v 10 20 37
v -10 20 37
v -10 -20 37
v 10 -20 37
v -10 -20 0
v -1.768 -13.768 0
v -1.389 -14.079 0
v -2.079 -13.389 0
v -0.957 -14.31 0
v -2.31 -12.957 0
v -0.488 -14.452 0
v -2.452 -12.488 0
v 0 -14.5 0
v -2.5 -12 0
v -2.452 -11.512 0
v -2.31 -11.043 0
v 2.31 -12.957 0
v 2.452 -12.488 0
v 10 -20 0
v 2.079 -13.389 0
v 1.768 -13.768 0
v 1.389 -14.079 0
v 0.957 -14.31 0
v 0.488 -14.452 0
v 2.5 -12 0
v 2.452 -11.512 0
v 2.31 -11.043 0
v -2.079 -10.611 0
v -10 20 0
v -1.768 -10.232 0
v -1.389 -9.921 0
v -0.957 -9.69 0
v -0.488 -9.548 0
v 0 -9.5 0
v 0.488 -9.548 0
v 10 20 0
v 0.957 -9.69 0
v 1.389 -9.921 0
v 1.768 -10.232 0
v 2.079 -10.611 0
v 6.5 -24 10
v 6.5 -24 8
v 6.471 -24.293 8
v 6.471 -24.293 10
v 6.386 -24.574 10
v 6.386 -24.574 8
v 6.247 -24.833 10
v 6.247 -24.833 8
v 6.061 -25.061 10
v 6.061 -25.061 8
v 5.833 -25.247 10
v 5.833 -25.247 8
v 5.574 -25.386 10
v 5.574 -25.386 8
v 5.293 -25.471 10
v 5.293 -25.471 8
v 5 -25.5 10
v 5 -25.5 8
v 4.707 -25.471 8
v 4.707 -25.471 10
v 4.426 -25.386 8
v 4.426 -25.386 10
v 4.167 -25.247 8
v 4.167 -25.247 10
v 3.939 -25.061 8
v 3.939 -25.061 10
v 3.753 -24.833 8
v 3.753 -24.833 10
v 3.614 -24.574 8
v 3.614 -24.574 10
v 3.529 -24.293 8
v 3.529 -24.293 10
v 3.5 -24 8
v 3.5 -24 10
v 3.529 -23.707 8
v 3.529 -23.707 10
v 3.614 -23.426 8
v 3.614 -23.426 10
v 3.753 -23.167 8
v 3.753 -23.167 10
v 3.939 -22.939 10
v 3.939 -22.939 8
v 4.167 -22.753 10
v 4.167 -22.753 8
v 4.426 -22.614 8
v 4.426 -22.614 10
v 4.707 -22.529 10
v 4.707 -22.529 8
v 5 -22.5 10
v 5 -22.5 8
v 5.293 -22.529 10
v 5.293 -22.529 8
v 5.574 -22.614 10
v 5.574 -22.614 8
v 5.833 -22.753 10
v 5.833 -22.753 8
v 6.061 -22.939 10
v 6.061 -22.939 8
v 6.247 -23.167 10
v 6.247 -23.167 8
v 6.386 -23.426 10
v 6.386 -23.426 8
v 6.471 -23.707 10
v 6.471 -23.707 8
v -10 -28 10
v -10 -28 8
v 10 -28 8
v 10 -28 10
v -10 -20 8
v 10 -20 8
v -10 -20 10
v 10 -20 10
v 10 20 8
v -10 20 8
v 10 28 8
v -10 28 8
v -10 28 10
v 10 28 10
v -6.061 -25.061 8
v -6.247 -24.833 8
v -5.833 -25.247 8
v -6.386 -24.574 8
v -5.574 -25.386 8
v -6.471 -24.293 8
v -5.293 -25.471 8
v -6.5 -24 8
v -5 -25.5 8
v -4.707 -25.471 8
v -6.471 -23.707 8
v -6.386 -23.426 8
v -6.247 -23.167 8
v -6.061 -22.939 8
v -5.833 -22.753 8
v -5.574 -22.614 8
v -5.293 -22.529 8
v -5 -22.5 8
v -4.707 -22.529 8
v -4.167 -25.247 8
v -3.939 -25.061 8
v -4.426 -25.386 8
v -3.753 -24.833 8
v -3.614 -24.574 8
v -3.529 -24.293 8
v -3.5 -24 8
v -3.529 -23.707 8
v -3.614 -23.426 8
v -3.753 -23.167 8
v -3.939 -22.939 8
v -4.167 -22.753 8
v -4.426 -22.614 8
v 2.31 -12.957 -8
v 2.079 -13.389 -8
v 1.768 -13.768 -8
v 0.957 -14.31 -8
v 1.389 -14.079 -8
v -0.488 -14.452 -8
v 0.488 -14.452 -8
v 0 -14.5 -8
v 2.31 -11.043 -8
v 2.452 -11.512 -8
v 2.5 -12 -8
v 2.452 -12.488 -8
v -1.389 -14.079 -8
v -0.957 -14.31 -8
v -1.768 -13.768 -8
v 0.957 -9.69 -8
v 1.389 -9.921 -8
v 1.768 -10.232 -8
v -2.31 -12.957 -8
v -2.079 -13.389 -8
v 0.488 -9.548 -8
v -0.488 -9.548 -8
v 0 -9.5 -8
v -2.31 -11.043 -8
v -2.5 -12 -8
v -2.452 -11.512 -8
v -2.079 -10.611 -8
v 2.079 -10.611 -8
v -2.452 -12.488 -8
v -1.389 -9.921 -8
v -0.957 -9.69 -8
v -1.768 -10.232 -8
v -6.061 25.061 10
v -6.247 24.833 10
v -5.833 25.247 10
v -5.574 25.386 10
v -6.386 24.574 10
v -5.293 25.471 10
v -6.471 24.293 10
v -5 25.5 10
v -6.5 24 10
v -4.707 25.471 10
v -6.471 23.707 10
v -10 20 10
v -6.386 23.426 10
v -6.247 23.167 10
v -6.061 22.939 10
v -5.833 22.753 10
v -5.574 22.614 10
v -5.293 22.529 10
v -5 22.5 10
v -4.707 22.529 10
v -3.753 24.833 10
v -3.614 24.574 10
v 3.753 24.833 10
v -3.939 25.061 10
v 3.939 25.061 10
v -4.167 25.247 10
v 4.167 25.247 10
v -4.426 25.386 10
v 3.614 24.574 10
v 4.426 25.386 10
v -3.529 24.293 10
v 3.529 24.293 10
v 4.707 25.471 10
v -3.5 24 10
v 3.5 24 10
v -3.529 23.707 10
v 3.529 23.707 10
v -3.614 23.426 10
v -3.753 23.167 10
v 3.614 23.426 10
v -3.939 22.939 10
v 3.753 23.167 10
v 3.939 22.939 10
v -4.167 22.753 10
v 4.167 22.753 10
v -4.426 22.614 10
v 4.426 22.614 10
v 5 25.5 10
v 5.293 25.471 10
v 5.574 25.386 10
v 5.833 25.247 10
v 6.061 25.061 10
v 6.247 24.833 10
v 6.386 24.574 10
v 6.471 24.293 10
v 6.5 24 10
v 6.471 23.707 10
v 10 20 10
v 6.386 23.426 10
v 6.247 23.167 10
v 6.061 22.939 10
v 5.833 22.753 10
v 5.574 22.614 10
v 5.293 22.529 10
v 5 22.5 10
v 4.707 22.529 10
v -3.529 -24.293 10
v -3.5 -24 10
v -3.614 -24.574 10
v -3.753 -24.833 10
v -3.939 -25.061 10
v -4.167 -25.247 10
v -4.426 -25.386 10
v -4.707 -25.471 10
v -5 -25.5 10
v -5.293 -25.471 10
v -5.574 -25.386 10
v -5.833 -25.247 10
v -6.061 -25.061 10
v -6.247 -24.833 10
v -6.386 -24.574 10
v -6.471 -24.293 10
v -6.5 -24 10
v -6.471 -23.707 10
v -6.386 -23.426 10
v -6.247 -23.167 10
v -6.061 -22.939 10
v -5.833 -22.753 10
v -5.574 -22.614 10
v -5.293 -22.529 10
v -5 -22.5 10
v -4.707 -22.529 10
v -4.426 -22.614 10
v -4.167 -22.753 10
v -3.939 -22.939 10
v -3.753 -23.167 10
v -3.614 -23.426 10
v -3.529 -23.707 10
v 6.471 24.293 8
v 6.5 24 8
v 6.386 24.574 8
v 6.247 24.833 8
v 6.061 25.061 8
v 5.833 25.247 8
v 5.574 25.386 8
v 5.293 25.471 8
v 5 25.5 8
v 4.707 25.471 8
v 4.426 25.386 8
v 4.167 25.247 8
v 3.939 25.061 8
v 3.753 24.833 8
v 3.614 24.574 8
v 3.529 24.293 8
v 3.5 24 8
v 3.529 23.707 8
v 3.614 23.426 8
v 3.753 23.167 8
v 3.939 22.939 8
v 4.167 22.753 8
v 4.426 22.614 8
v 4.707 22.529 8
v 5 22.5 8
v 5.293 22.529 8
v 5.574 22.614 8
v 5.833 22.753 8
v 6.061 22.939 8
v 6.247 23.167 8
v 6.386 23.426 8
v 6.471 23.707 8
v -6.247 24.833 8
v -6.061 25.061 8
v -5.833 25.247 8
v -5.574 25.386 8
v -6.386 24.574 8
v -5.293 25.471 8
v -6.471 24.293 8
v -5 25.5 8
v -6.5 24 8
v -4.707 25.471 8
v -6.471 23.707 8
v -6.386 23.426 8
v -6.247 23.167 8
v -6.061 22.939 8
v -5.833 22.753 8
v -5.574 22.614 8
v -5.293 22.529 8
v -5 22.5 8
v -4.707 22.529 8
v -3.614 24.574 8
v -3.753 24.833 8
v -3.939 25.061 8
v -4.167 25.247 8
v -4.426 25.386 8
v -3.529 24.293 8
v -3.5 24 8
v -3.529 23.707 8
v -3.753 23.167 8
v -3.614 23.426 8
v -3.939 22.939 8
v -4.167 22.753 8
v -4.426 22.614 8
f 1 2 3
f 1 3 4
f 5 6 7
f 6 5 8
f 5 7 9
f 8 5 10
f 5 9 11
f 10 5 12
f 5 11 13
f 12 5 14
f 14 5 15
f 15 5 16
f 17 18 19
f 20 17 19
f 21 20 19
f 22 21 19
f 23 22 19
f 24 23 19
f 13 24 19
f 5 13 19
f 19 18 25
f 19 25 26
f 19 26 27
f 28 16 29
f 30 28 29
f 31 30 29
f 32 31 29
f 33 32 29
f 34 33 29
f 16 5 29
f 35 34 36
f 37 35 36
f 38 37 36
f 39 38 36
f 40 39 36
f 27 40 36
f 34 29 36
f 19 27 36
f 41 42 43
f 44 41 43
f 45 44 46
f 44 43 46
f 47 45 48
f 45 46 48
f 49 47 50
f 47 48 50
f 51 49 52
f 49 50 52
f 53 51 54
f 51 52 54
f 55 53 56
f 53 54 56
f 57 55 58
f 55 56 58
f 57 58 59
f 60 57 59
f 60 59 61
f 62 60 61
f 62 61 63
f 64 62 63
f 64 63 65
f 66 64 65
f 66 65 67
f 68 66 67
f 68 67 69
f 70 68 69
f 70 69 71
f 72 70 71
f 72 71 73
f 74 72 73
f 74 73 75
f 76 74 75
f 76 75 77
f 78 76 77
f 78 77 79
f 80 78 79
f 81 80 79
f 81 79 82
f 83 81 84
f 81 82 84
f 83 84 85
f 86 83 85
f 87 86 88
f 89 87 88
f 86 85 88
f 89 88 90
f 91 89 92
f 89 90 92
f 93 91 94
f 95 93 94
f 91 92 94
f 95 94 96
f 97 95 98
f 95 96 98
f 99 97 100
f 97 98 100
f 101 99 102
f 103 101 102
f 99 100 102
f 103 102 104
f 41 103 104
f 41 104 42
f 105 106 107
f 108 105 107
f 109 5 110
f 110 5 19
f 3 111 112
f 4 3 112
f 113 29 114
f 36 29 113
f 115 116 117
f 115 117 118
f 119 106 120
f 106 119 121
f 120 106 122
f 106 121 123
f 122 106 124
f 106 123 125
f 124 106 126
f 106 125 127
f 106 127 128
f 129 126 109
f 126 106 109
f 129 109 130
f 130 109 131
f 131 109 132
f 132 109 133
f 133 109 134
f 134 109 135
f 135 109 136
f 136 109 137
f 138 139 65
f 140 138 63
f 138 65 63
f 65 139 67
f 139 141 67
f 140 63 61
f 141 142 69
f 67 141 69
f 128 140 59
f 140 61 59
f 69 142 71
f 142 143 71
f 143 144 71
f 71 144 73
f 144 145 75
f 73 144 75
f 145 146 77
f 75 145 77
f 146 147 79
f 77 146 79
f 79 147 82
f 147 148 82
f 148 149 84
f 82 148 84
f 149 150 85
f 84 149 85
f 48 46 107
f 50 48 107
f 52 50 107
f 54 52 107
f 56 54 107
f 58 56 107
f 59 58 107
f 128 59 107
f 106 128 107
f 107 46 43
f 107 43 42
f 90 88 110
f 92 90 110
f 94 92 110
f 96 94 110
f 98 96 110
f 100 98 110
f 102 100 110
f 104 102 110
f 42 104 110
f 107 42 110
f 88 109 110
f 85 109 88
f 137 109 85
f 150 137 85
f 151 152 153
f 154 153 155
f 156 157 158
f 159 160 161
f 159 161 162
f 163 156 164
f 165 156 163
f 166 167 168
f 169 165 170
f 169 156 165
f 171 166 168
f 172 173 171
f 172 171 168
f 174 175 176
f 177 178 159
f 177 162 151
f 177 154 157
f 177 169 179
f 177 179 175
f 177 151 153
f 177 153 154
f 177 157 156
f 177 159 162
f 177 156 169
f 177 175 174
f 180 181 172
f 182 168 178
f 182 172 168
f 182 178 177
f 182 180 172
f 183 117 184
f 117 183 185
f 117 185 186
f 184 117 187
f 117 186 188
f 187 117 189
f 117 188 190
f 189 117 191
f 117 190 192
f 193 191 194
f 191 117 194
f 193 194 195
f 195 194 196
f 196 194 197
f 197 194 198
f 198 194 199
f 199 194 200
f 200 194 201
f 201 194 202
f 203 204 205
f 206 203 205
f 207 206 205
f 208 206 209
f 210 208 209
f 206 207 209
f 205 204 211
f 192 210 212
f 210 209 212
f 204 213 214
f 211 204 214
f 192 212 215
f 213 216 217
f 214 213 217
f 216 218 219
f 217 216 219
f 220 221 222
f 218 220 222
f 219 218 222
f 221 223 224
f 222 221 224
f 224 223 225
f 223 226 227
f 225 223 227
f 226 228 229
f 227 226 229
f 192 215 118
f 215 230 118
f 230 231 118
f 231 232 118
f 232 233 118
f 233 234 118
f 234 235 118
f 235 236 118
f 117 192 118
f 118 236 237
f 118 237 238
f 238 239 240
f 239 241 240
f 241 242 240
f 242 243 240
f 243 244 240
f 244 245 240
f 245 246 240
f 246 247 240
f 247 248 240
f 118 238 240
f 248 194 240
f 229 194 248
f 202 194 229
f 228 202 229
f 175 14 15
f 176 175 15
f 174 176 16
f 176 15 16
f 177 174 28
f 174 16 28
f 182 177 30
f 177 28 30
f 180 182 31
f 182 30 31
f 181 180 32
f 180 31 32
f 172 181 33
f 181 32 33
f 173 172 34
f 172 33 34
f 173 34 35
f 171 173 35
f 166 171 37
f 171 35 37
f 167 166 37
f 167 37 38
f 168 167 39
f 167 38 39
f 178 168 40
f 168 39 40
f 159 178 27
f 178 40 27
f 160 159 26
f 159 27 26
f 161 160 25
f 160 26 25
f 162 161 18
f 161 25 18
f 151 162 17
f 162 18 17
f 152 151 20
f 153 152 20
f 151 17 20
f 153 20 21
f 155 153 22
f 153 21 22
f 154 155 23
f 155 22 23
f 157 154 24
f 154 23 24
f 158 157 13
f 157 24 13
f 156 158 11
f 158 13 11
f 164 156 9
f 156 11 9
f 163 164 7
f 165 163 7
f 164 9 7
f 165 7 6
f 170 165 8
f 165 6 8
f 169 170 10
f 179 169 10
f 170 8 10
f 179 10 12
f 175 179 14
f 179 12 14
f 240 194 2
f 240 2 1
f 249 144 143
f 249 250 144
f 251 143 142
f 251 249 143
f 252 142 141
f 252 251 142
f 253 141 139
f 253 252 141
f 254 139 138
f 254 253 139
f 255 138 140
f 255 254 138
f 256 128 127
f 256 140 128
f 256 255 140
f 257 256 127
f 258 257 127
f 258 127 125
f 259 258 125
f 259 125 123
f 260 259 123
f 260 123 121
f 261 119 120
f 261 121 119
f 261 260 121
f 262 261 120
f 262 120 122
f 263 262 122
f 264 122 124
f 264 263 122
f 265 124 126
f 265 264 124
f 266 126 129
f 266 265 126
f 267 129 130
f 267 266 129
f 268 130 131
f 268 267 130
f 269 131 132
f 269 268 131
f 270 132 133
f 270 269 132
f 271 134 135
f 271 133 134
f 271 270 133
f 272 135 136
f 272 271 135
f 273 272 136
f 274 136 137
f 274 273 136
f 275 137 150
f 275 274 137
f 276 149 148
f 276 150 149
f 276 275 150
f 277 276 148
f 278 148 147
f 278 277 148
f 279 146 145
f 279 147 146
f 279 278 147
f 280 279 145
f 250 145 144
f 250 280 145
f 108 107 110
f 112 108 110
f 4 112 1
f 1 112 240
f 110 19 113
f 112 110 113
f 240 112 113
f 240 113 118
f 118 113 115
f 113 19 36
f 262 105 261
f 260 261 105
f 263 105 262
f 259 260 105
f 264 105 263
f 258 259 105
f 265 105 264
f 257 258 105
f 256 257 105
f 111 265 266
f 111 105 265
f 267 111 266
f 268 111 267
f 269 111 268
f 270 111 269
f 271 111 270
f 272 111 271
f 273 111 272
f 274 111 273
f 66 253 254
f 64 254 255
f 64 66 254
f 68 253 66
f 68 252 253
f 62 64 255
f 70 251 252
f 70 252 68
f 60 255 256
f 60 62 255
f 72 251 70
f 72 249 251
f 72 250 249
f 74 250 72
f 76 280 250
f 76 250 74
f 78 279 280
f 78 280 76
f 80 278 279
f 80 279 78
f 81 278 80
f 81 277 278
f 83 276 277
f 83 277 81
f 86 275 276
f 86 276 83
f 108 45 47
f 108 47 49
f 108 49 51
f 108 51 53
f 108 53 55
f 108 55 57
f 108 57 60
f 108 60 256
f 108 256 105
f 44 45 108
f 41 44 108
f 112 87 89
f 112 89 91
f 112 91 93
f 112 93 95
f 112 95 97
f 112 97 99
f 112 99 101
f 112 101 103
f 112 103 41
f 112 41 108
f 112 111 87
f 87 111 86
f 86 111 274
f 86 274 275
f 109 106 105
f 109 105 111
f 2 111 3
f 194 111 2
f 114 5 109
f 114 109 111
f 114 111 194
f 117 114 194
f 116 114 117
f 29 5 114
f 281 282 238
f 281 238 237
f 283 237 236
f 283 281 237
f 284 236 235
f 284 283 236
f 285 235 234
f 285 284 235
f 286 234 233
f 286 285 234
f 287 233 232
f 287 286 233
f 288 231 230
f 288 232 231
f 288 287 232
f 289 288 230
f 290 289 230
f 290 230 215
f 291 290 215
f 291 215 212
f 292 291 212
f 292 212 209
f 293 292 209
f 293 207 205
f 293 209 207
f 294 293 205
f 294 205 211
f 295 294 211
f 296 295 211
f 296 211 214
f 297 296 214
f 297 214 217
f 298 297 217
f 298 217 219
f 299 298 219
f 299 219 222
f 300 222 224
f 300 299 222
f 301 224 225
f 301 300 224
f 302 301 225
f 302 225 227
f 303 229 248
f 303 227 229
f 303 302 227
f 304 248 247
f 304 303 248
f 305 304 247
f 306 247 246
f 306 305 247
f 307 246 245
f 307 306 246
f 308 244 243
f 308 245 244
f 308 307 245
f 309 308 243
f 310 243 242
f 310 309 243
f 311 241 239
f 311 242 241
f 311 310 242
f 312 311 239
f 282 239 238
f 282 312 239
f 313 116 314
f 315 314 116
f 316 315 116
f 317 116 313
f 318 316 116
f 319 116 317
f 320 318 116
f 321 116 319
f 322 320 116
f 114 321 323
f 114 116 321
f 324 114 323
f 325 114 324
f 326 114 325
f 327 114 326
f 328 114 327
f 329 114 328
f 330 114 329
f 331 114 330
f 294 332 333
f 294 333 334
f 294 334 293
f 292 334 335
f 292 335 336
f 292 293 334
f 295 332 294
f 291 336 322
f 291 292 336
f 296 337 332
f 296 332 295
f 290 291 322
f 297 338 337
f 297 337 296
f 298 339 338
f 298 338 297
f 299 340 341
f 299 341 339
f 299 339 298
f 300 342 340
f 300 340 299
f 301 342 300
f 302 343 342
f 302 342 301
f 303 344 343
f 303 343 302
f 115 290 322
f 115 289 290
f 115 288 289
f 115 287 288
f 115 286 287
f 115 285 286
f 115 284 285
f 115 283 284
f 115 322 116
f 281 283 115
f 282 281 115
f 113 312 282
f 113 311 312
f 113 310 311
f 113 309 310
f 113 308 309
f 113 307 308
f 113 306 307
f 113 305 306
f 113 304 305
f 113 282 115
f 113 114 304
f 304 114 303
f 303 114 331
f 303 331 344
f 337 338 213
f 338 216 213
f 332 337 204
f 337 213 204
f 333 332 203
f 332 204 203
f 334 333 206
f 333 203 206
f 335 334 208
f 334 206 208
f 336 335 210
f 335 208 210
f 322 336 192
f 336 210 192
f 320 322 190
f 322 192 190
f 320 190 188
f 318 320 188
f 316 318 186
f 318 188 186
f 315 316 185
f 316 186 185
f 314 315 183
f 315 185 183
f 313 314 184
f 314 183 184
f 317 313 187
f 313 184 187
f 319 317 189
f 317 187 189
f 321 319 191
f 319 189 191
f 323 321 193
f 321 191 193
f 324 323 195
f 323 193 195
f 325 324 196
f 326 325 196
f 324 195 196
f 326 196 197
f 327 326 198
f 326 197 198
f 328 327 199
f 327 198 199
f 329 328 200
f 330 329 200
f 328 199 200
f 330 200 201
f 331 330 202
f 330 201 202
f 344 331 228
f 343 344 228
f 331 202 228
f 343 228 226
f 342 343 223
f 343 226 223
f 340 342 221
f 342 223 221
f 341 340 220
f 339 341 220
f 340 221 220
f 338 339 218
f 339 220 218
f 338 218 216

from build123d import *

# Parameters (mm, degrees)
SKETCH1_W           = 20
SKETCH1_H           = 40
BOSS_EXTRUDE1_DEPTH = 37
SKETCH2_W           = 20
SKETCH2_H           = 2
BOSS_EXTRUDE2_DEPTH = 8
SKETCH3_R           = 1.5
CUT_EXTRUDE2_DEPTH  = 48.465777145
SKETCH4_R           = 2.5
BOSS_EXTRUDE3_DEPTH = 8


with BuildPart() as part:
    # Sketch1 → Boss-Extrude1 (new body)
    with BuildSketch(Plane.XY):
        Rectangle(SKETCH1_W, SKETCH1_H)
    extrude(amount=BOSS_EXTRUDE1_DEPTH)

    # Sketch2 → Boss-Extrude2 (add)
    with BuildSketch(Plane(origin=(0, 20, 0), x_dir=(1, 0, 0), z_dir=(0, 1, 0))):
        with Locations((0, -9)):
            Rectangle(SKETCH2_W, SKETCH2_H)
    boss_extrude2 = extrude(amount=BOSS_EXTRUDE2_DEPTH)

    # Sketch3 → Cut-Extrude2 (cut, symmetric)
    with BuildSketch(Plane.XY):
        with Locations((5, 24)):
            Circle(SKETCH3_R)
        with Locations((-5, 24)):
            Circle(SKETCH3_R)
    cut_extrude2 = extrude(amount=CUT_EXTRUDE2_DEPTH, both=True, mode=Mode.SUBTRACT)

    # Mirror3: Boss-Extrude2, Cut-Extrude2 across plane
    add(boss_extrude2.mirror(Plane.ZX))
    add(cut_extrude2.mirror(Plane.ZX), mode=Mode.SUBTRACT)

    # Sketch4 → Boss-Extrude3 (add)
    with BuildSketch(Plane(origin=(0, 0, 0), x_dir=(-1, 0, 0), z_dir=(0, 0, -1))):
        with Locations((0, -12)):
            Circle(SKETCH4_R)
    extrude(amount=BOSS_EXTRUDE3_DEPTH)


solid = part.part
